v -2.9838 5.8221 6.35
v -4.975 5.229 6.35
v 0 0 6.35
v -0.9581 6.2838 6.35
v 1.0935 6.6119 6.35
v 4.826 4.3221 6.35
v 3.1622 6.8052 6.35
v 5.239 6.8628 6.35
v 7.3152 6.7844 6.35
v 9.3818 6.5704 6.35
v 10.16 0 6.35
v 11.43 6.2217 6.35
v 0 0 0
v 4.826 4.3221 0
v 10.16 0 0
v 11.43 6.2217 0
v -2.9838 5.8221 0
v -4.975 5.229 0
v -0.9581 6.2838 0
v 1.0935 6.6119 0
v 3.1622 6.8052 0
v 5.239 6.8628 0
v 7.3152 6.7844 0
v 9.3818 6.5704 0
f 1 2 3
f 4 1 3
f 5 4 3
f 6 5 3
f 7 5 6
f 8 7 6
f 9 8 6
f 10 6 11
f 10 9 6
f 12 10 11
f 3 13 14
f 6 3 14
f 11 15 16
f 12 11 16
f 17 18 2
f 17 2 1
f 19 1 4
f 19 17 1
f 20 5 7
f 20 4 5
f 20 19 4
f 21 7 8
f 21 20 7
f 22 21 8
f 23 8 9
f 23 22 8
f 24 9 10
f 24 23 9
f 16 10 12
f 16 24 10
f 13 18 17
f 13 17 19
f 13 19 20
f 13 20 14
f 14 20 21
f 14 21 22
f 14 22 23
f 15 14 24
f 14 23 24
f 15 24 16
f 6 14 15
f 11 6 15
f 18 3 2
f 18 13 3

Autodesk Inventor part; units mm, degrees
ref_plane "YZ Plane" through (0, 0, 0) normal (1, 0, 0) x (0, 1, 0)
ref_plane "XZ Plane" through (0, 0, 0) normal (0, 1, 0) x (-1, 0, 0)
ref_plane "XY Plane" through (0, 0, 0) normal (0, 0, 1) x (1, 0, 0)
sketch "Sketch1" plane through (0, 0, 0) normal (0, 0, 1) x (1, 0, 0)
  line L0 (0, 0) -> (4.826, 4.3221)
  line L1 (4.826, 4.3221) -> (10.16, 0)
  line L2 (10.16, 0) -> (11.43, 6.2217)
  line L3 (0, 0) -> (-4.975, 5.229)
  arc A0 (11.43, 6.2217) -> (-4.975, 5.229) centre (5.08, -24.8868) ccw
  circle A1 centre (5.08, -24.8868) radius 25.4 construction
  circle A2 centre (5.08, -24.8868) radius 21.59 construction
  circle A3 centre (5.08, -49.6518) radius 1.5875
  line L4 (5.08, -49.6518) -> (5.08, -46.4768) construction
  line L5 (0, 0) -> (0, -3.2502)
  circle A4 centre (5.08, -24.8868) radius 22.225
  circle A5 centre (5.08, -49.6518) radius 3.81
  dimension "d40" = 43.18
  dimension "d0" = 31.75
  dimension "d2" = 50.8
  dimension "d3" = 29.21
  dimension "d4" = 30
  dimension "d5" = 10.16
  dimension "d6" = 5.334
  dimension "d43" = 3.175
  dimension "d44" = 3.175
  dimension "d53" = 44.45
  dimension "d54" = 7.62
extrude "Extrusion1" add sketch "Sketch1" along normal blind 6.35 contours L3 A0 L2 L1 L0
properties part number "BearingHolder2" material "ABS Plastic"
